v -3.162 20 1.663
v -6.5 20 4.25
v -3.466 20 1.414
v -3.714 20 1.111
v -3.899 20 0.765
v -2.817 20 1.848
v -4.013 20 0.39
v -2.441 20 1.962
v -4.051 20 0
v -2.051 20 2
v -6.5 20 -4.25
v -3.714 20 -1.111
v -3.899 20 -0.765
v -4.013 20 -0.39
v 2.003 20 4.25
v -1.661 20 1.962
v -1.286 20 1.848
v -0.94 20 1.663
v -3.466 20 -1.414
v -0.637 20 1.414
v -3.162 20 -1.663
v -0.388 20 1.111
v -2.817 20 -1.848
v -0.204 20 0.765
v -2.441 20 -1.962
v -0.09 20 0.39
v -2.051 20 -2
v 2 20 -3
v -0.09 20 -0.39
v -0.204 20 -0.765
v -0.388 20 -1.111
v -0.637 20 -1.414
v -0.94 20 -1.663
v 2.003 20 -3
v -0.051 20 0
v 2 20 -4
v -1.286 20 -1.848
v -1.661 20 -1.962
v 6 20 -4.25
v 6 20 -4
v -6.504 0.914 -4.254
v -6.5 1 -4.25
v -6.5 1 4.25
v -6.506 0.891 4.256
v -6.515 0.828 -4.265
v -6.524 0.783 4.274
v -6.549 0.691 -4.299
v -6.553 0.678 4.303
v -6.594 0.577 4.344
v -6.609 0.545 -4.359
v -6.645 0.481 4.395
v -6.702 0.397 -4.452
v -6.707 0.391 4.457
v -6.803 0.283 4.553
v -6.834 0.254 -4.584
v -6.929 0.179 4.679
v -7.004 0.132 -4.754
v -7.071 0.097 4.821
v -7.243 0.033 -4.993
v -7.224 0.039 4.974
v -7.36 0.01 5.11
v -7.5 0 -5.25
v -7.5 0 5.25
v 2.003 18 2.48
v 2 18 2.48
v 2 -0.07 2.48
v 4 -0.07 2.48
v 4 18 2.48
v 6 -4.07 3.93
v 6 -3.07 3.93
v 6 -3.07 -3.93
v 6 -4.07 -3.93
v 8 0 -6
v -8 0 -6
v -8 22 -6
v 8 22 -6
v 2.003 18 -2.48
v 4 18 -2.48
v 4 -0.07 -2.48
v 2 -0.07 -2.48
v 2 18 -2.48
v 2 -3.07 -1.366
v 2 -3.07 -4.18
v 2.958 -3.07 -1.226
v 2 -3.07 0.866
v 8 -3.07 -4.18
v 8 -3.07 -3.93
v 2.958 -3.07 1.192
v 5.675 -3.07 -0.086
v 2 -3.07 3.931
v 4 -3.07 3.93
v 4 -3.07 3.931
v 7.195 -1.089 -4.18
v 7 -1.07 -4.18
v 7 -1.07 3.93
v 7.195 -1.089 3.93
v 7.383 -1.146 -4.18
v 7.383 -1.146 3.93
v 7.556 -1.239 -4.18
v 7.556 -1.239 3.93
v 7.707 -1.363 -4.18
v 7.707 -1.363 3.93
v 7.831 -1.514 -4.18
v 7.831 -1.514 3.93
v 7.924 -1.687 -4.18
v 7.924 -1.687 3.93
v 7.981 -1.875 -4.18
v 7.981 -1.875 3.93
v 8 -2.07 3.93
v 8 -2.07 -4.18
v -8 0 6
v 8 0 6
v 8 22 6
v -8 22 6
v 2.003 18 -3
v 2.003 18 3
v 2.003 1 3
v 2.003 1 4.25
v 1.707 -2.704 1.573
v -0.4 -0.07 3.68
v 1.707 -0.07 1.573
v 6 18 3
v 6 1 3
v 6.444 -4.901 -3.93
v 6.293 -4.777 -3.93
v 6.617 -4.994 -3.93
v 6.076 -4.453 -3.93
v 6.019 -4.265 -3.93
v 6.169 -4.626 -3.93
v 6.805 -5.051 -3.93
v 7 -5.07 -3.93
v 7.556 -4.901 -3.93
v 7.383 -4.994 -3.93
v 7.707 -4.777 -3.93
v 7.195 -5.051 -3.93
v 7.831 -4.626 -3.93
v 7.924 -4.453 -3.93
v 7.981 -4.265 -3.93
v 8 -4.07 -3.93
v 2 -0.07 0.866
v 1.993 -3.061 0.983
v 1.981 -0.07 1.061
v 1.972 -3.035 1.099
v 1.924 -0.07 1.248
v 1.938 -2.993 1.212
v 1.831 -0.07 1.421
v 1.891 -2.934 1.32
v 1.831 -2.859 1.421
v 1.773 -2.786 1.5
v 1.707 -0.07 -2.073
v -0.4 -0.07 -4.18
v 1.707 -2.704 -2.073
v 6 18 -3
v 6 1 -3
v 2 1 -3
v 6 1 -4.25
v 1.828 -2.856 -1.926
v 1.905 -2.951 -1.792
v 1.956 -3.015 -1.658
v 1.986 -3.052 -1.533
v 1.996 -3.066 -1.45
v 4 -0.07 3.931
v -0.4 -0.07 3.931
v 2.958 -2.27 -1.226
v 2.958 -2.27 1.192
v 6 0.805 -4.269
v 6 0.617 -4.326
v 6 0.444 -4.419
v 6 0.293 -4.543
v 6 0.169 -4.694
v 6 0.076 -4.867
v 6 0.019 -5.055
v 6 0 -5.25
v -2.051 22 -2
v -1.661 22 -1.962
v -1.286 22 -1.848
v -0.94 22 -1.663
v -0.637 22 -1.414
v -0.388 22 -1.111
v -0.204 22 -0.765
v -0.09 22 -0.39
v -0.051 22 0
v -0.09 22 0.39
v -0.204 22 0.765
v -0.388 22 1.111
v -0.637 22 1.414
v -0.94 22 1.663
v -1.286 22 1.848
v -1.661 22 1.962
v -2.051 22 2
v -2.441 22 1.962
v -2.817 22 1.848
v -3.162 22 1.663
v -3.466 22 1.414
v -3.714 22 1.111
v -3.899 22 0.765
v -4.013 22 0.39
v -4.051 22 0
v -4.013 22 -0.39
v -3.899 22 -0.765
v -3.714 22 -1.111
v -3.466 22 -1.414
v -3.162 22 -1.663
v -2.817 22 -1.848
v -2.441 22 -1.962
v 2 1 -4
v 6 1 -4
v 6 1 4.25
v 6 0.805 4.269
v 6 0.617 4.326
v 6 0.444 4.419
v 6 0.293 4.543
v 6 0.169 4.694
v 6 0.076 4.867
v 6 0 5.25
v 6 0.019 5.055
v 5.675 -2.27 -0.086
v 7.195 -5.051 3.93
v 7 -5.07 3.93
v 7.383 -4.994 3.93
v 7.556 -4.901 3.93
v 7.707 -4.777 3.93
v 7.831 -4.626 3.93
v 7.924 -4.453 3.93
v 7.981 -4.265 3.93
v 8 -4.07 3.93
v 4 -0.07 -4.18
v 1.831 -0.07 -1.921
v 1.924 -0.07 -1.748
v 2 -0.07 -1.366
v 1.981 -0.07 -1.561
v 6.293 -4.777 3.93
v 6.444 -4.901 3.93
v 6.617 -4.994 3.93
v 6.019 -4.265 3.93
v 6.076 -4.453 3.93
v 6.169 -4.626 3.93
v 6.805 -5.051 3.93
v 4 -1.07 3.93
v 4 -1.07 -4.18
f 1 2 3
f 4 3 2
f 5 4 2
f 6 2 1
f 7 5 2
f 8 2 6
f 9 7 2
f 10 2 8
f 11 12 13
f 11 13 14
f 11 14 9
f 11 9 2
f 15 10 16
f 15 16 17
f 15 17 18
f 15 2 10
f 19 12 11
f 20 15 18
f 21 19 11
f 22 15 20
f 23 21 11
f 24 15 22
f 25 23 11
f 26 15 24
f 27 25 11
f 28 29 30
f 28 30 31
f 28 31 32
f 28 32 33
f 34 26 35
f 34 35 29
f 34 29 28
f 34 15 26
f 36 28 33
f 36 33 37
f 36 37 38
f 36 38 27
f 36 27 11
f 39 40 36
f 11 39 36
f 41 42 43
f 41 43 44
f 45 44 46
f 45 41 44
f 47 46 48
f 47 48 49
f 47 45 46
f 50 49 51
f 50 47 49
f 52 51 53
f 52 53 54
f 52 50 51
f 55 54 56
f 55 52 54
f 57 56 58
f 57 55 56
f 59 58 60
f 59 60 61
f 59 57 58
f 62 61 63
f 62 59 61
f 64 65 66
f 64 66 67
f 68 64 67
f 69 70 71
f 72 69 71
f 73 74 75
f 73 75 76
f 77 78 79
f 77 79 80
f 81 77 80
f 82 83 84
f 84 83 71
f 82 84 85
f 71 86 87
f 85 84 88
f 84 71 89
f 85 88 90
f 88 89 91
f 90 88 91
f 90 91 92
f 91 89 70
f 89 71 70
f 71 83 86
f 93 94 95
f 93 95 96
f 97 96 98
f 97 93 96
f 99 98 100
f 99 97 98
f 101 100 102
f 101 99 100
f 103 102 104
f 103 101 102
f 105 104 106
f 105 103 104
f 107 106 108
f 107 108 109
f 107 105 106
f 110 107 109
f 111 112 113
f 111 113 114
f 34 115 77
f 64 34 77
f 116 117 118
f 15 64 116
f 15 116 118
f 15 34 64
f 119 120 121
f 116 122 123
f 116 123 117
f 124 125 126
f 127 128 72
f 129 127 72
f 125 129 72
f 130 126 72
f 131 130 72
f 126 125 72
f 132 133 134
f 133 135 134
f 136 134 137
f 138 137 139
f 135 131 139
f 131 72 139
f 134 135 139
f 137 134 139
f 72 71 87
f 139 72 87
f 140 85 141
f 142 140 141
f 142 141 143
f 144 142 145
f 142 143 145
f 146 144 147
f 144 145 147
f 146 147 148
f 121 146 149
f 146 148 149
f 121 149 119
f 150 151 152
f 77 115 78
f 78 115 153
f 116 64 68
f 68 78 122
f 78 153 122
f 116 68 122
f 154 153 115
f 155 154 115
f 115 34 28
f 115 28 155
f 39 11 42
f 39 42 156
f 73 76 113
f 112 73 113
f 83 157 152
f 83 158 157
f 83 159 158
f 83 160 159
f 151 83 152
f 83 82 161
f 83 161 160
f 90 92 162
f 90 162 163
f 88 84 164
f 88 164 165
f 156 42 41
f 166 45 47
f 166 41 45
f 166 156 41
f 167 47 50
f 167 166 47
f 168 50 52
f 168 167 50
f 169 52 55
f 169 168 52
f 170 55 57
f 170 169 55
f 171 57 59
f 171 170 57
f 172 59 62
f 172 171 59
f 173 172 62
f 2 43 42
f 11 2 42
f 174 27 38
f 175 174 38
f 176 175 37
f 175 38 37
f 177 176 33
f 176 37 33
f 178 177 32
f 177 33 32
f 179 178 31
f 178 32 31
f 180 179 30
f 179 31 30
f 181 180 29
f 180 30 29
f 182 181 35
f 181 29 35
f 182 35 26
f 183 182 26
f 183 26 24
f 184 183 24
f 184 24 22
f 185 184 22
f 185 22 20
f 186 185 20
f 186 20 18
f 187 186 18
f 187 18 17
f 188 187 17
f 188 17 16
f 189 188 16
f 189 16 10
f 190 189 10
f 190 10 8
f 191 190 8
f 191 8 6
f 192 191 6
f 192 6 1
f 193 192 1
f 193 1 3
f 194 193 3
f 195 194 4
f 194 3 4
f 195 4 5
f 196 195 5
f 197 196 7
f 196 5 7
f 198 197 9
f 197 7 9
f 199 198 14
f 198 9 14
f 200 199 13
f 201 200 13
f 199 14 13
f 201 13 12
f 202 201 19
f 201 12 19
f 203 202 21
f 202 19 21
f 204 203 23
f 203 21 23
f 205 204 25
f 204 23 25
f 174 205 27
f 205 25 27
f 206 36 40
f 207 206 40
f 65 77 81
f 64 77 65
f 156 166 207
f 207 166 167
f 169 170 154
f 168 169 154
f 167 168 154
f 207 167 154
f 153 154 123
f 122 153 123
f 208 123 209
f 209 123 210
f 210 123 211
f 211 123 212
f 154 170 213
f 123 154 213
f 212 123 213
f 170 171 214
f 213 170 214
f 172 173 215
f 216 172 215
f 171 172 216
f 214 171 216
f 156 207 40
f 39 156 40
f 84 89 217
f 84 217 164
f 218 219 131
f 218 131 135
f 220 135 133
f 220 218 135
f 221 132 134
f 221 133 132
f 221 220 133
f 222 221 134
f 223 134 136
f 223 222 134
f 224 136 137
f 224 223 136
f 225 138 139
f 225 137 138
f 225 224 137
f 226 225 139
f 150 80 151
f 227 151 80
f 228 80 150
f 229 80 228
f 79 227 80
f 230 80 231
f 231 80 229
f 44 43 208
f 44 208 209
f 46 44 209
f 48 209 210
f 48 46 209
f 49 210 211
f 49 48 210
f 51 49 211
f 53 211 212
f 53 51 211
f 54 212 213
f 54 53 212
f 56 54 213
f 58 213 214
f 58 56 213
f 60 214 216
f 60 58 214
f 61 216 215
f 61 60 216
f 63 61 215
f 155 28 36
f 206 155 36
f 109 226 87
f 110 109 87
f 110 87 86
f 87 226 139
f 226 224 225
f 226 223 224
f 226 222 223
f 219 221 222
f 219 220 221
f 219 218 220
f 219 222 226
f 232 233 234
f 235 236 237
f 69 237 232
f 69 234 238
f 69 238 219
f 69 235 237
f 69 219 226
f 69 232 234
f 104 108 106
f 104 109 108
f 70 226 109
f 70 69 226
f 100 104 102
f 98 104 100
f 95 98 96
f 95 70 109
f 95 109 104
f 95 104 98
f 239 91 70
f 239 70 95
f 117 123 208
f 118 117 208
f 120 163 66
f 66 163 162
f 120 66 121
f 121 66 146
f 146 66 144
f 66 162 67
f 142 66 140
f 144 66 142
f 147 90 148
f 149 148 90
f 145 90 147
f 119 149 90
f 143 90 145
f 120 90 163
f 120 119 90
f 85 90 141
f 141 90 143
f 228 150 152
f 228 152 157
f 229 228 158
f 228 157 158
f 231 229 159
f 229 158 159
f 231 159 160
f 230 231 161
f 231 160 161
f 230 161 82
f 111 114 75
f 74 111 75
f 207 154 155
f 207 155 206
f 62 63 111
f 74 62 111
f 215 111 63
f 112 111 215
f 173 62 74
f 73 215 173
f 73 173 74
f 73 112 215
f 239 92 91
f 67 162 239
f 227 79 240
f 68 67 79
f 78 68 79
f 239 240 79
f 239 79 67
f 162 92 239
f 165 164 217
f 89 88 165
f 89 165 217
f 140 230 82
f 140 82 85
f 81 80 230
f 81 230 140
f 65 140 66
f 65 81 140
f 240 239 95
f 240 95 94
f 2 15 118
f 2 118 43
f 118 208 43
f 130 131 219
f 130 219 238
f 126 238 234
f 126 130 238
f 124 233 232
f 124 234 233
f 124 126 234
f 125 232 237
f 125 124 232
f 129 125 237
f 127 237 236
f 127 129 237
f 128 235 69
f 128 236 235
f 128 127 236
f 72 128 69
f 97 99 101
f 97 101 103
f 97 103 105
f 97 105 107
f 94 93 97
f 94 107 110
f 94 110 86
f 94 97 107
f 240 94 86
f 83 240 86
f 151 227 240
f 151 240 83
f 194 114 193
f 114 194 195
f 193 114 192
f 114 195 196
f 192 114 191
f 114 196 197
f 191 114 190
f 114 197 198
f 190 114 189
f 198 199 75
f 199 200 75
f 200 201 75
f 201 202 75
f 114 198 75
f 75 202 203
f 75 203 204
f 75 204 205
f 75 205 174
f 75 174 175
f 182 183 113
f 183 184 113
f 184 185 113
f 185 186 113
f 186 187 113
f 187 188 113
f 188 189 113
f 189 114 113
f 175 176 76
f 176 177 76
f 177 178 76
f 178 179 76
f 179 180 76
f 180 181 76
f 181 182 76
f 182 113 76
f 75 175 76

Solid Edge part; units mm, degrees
sketch "Sketch1" plane through (0, 0, 0) normal (0, -1, 0) x (1, 0, 0)
  line L0 (8, 6) -> (-8, 6)
  line L1 (-8, 6) -> (-8, -6)
  line L2 (-8, -6) -> (8, -6)
  line L3 (8, -6) -> (8, 6)
extrude "Protrusion1" add sketch "Sketch1" against normal blind 22
sketch "Sketch2" plane through (0, 0, 0) normal (0, -1, 0) x (1, 0, 0)
  line L0 (6, 4.25) -> (-6.5, 4.25)
  line L1 (-6.5, 4.25) -> (-6.5, -4.25)
  line L2 (-6.5, -4.25) -> (6, -4.25)
  line L3 (6, -4.25) -> (6, 4.25)
extrude "Cutout1" cut sketch "Sketch2" against normal blind 20
sketch "Sketch3" plane through (0, 20, 0) normal (0, -1, 0) x (1, 0, 0)
  line L0 (6, -3) -> (2, -3)
  line L1 (2, -3) -> (2, -4)
  line L2 (2, -4) -> (6, -4)
  line L3 (6, -4) -> (6, -3)
  line L4 (6, 3) -> (2.0028, 3)
  line L5 (2.0028, 3) -> (2.0028, 4.25)
  line L6 (2.0028, 4.25) -> (6, 4.25)
  line L7 (6, 4.25) -> (6, 3)
extrude "LockSideProtrusion" add sketch "Sketch3" along normal blind 19
sketch "Sketch4" plane through (0, 20, 0) normal (0, -1, 0) x (1, 0, 0)
  line L0 (6, 3) -> (6, -3)
  line L1 (6, -3) -> (2.0028, -3)
  line L2 (2.0028, -3) -> (2.0028, 3)
  line L3 (2.0028, 3) -> (6, 3)
extrude "LockBaseProtrusion" add sketch "Sketch4" along normal blind 2
sketch "Sketch5" plane through (4.0014, 18, 0) normal (0, -1, 0) x (1, 0, 0)
  line L0 (-0.0014, 2.48) -> (-0.0014, -2.48)
  line L1 (-0.0014, -2.48) -> (-2.0014, -2.48)
  line L2 (-2.0014, -2.48) -> (-2.0014, 2.48)
  line L3 (-2.0014, 2.48) -> (-0.0014, 2.48)
extrude "LockProtrusion" add sketch "Sketch5" along normal blind 18.07
sketch "Sketch6" plane through (3, -0.07, 0) normal (0, -1, 0) x (1, 0, 0)
  line L0 (-1, -4.18) -> (-1, 3.68)
  line L1 (-1, 3.68) -> (1, 3.68)
  line L2 (1, 3.68) -> (1, -4.18)
  line L3 (1, -4.18) -> (-1, -4.18)
extrude "LockHeadMainProtrusion" add sketch "Sketch6" along normal blind 3
sketch "Sketch7" plane through (3, -0.07, 0) normal (0, -1, 0) x (1, 0, 0)
  line L0 (-3.4, 3.68) -> (-1, 1.28)
  line L1 (-1, 1.28) -> (-1, 3.68)
  line L2 (-1, 3.68) -> (-3.4, 3.68)
  line L3 (-3.4, -4.18) -> (-1, -1.78)
  line L4 (-1, -1.78) -> (-1, -4.18)
  line L5 (-1, -4.18) -> (-3.4, -4.18)
  dimension "D1" = 0.07
  dimension "D2" = 7.86
  dimension "D3" = 0.57
extrude "LockHeadTriangleProtrusion" add sketch "Sketch7" along normal blind 3
sketch "Sketch8" plane through (1.8, -1.57, -4.18) normal (0, 0, -1) x (1, 0, 0)
  line L0 (-2.2, 1.5) -> (0.2, 1.5)
  line L1 (0.2, 1.5) -> (-2.2, -1.5)
  line L2 (-2.2, -1.5) -> (-2.2, 1.5)
extrude "LockHeadTriangleCut" cut sketch "Sketch8" against normal blind 8.6519
sketch "Sketch9" plane through (4, 7.465, 0) normal (1, 0, 0) x (0, 0, 1)
  line L0 (-4.18, 10.535) -> (3.93, 10.535)
  line L1 (3.93, 10.535) -> (3.93, 8.535)
  line L2 (3.93, 8.535) -> (-4.18, 8.535)
  line L3 (-4.18, 8.535) -> (-4.18, 10.535)
extrude "FlapBaseProtrusion" add sketch "Sketch9" along normal blind 4
sketch "Sketch10" plane through (5, -3.07, 0) normal (0, -1, 0) x (1, 0, 0)
  line L0 (3, 3.93) -> (1, 3.93)
  line L1 (1, 3.93) -> (1, -3.93)
  line L2 (1, -3.93) -> (3, -3.93)
  line L3 (3, -3.93) -> (3, 3.93)
extrude "FlapHandleProtrusion" add sketch "Sketch10" along normal blind 2
fillet "SlotInnerRound" radius 1 3 edges at (-0.25, 0, 4.25) (-6.5, 0, 0) (-0.25, 0, -4.25)
fillet "FlapRound" radius 1 3 edges at (6, -5.07, 0) (8, -5.07, 0) (8, -1.07, -0.125)
sketch "Sketch11" plane through (4, -3.07, 0) normal (0, -1, 0) x (-1, 0, 0)
  line L0 (-1.6753, 0.0864) -> (1.042, 1.2263)
  line L1 (1.042, 1.2263) -> (1.042, -1.1917)
  line L2 (1.042, -1.1917) -> (-1.6753, 0.0864)
extrude "MarkCut" cut sketch "Sketch11" against normal blind 0.8
hole "PushHole" at (-2.0513, 20, 0) direction (0, 1, 0) diameter 4 end through all
fillet "LockTriangleRound" radius 1 2 edges at (2, -1.57, 1.28) (2, -1.57, -1.78)
sketch "Sketch12" plane through (1.8, -1.57, 3.68) normal (0, 0, 1) x (1, 0, 0)
  line L0 (2.2, 0.725) -> (2.2, 0.3676)
  line L1 (2.2, 0.3676) -> (2.2, -1.5)
  line L2 (2.2, -1.5) -> (0.2, -1.5)
  line L3 (0.2, -1.5) -> (-2.2, 1.5)
  line L4 (-2.2, 1.5) -> (2.2, 1.5)
  line L5 (2.2, 1.5) -> (2.2, 0.725)
extrude "Protrusion2" add sketch "Sketch12" along normal blind 0.2509
